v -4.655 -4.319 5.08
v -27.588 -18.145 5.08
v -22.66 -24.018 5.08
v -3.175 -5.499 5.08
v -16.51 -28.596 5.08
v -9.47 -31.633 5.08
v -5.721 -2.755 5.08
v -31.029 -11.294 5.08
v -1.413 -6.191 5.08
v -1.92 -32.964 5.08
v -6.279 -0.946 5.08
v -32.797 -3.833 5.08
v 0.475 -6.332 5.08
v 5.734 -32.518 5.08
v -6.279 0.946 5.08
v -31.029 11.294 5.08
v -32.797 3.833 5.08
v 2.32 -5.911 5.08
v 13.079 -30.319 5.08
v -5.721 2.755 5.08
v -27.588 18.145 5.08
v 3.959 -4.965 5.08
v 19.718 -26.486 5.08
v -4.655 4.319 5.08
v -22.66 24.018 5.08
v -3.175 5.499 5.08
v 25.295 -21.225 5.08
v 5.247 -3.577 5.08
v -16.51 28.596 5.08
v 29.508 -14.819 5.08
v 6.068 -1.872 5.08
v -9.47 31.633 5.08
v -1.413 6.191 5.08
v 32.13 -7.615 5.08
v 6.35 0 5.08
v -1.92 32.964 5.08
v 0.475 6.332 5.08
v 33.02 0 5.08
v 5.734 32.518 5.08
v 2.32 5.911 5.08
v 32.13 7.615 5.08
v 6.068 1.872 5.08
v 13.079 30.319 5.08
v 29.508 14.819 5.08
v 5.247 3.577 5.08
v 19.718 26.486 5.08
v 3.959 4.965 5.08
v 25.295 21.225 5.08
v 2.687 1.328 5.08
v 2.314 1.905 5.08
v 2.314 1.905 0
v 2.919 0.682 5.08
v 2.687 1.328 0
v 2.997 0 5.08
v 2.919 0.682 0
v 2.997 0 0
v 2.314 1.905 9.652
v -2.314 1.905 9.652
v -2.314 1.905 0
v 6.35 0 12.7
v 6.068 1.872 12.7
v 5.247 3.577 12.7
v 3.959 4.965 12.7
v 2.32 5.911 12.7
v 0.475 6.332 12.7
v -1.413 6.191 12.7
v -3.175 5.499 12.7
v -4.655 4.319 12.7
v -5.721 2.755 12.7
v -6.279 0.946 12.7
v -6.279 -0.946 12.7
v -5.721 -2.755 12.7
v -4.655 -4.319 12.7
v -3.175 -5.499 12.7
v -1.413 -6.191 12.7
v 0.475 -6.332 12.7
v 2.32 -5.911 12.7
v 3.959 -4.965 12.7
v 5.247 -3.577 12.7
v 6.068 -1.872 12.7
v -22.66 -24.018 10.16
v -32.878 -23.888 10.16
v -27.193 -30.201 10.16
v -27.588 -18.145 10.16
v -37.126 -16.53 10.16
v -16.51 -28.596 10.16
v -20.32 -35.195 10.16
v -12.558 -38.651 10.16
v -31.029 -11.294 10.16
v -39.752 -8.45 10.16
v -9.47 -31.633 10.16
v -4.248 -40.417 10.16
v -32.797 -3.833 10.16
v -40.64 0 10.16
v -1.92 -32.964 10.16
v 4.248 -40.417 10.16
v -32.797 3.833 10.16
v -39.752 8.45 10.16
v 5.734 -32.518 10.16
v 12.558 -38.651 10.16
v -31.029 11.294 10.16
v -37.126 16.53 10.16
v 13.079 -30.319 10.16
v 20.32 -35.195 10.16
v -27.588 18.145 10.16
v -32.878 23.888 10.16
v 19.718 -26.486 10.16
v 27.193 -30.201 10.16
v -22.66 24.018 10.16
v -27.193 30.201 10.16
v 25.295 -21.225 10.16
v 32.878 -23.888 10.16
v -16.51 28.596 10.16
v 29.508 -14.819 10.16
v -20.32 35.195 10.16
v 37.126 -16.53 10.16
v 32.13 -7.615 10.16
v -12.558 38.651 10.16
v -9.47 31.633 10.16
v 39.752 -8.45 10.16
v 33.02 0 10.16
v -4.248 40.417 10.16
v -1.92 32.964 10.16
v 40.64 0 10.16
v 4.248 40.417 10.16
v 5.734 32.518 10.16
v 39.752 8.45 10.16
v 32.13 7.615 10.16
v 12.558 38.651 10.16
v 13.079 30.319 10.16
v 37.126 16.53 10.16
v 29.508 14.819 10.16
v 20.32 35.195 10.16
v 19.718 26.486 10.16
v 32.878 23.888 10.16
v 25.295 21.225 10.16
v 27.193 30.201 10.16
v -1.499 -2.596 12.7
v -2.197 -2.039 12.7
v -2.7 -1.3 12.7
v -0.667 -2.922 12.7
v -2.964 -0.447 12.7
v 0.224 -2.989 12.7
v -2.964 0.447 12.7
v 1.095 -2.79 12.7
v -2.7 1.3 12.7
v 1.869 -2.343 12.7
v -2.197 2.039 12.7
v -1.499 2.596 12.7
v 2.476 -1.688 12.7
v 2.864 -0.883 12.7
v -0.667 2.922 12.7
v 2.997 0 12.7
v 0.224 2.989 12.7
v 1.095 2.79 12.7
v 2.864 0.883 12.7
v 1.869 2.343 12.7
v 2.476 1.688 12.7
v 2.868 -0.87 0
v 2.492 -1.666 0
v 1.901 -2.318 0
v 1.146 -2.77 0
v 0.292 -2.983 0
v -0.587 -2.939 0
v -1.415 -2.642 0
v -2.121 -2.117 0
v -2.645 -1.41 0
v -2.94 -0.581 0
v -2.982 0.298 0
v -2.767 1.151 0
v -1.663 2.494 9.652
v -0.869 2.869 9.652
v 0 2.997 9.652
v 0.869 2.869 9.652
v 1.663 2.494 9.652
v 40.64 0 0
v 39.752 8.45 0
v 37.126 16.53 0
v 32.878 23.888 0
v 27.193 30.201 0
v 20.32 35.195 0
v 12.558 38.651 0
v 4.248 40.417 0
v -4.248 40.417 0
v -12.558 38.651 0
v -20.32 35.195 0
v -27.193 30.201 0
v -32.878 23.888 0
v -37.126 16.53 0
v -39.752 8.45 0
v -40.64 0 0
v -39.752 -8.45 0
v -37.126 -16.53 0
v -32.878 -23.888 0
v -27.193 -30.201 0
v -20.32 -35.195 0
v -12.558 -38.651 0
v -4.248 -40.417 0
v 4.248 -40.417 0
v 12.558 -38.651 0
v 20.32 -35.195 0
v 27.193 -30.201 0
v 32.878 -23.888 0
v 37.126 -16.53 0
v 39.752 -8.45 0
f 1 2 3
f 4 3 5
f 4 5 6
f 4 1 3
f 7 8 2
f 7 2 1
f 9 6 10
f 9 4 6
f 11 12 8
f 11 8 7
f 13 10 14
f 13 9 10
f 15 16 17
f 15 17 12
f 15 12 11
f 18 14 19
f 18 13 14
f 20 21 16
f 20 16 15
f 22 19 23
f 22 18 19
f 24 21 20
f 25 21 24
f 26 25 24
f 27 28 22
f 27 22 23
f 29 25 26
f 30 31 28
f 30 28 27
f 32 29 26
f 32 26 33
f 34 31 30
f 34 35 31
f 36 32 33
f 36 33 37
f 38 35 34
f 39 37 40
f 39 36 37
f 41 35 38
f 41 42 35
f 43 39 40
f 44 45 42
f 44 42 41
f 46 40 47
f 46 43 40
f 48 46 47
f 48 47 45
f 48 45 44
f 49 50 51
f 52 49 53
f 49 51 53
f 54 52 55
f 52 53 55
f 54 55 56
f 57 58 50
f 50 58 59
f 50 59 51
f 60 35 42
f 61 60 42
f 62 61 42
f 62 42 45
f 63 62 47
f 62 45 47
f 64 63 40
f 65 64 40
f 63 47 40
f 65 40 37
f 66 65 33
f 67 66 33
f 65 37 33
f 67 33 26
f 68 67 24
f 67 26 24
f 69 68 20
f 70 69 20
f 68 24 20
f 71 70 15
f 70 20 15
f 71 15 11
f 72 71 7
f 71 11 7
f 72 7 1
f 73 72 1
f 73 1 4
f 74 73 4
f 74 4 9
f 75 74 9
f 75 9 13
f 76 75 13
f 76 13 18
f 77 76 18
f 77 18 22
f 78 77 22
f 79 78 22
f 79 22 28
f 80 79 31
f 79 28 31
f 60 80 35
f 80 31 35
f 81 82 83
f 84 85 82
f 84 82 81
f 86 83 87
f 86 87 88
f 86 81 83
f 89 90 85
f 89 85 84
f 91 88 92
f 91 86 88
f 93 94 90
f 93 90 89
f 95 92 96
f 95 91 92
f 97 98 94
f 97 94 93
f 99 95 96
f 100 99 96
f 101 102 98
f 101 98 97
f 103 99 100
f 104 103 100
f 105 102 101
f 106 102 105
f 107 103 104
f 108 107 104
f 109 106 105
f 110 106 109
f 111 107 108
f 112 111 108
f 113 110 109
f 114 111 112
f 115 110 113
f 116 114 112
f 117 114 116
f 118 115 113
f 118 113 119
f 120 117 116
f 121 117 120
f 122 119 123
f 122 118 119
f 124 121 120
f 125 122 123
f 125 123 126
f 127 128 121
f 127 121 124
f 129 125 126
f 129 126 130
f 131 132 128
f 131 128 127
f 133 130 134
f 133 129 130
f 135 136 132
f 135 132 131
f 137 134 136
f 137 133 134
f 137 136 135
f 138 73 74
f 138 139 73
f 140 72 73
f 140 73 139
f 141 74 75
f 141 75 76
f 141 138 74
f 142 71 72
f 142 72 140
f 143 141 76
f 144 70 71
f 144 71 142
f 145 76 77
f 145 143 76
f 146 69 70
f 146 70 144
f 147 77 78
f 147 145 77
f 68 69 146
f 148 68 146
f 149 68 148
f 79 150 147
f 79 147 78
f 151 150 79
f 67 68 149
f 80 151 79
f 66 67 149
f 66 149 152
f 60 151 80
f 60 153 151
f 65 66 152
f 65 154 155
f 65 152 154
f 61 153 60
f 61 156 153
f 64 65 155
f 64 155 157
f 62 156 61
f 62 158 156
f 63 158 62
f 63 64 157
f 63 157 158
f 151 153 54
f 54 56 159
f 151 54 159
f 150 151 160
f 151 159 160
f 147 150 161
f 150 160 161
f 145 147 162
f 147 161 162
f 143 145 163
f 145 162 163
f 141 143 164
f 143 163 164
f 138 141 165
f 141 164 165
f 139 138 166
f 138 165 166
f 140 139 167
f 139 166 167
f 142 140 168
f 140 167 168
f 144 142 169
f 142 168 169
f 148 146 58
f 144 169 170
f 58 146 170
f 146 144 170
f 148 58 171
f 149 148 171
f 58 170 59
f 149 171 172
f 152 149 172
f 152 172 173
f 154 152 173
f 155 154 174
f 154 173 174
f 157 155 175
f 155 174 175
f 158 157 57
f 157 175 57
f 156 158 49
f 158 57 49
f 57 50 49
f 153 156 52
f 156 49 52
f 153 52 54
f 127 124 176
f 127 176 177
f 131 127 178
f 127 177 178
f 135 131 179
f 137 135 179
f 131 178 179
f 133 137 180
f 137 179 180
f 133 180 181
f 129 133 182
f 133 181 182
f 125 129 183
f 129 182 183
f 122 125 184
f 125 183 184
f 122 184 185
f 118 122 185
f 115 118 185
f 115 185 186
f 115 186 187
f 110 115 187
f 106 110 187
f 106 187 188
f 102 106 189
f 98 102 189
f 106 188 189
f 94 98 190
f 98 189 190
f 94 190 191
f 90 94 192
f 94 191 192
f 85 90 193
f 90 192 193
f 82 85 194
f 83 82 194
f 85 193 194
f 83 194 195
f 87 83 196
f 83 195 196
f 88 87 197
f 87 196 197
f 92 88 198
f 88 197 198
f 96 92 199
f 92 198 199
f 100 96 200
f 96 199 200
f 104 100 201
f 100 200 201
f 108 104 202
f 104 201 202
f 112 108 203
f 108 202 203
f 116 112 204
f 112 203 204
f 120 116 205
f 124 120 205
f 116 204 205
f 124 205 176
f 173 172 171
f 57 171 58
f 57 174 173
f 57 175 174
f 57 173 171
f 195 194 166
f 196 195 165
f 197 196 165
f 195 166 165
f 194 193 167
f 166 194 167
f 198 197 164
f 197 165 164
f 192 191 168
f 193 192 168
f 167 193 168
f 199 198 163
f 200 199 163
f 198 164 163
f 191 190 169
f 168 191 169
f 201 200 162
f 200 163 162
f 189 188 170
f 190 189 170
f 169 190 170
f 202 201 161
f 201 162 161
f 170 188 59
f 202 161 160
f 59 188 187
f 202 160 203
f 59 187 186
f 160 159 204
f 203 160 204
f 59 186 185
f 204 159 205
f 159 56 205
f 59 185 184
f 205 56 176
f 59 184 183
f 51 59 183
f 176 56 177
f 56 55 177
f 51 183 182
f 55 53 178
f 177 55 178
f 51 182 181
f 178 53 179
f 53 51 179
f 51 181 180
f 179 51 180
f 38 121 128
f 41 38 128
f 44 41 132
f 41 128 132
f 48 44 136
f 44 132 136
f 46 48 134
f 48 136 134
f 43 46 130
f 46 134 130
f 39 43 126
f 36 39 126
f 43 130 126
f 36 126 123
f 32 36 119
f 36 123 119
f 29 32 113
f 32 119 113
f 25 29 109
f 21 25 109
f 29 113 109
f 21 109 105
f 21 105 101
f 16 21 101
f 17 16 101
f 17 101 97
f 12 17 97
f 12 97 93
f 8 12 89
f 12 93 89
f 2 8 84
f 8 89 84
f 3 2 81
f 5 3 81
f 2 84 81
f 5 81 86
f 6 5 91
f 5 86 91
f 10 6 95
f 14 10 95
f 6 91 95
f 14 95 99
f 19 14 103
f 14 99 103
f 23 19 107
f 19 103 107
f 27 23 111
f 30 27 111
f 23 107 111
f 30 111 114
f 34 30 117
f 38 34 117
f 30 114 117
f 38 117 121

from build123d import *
from build123d import SkipClean  # not in build123d's __all__

# Parameters (mm, degrees)
F0_R          = 40.64
F1_DEPTH      = 10.16
F2_R          = 33.02
F3_DEPTH      = 5.08
F5_DEPTH      = 10.16
F6_R          = 6.35
F6_R_2        = 2.9972
F7_DEPTH      = 7.62
F7_DEPTH_BACK = 0.0127
F8_W          = 7.62
F8_H          = 2.54
F9_DEPTH      = 9.652


# Not quite as in the source:
# - after a boolean that leaves OpenCascade's solid faulty, fix() repairs it


with BuildPart() as f1:
    # F0 (on Top) → F1 (new body)
    with BuildSketch(Plane.XY):
        Circle(F0_R)
    extrude(amount=F1_DEPTH)

    # F2 (on face) → F3 (cut)
    with BuildSketch(Plane.XY.offset(10.16)):
        Circle(F2_R)
    extrude(amount=-F3_DEPTH, mode=Mode.SUBTRACT)

    # F4 (on face) → F5 (cut)
    with BuildSketch(Plane(origin=(0, 0, 0), x_dir=(1, 0, 0), z_dir=(0, 0, -1))):
        with BuildLine():
            Line((2.3139107243, -1.905), (-2.3139107243, -1.905))
            ThreePointArc((-2.3139107243, -1.905), (0, -2.9972), (2.3139107243, -1.905))
        make_face()
        with BuildLine():
            ThreePointArc((2.3139107243, -1.905), (2.8212108272, -1.0119176392), (2.9972, 0))
            ThreePointArc((2.9972, 0), (-1.0119176392, 2.8212108272), (-2.3139107243, -1.905))
            Line((-2.3139107243, -1.905), (2.3139107243, -1.905))
        make_face()
    extrude(amount=-F5_DEPTH, mode=Mode.SUBTRACT)

    # F6 (on face) → F7 (join, two sides)
    with BuildSketch(Plane.XY.offset(5.08)) as f7_sk:
        Circle(F6_R)
        Circle(F6_R_2, mode=Mode.SUBTRACT)
    with SkipClean():  # cleaning this boolean's faces spoils the solid; the shape is the same uncleaned
        extrude(amount=F7_DEPTH)
        extrude(f7_sk.sketch, amount=-F7_DEPTH_BACK)

    # F8 (on Top) → F9 (join)
    with BuildSketch(Plane.XY):
        with Locations((0, 3.175)):
            Rectangle(F8_W, F8_H)
    extrude(amount=F9_DEPTH)

    add(f1.part.fix(), mode=Mode.REPLACE)


solid = f1.part
